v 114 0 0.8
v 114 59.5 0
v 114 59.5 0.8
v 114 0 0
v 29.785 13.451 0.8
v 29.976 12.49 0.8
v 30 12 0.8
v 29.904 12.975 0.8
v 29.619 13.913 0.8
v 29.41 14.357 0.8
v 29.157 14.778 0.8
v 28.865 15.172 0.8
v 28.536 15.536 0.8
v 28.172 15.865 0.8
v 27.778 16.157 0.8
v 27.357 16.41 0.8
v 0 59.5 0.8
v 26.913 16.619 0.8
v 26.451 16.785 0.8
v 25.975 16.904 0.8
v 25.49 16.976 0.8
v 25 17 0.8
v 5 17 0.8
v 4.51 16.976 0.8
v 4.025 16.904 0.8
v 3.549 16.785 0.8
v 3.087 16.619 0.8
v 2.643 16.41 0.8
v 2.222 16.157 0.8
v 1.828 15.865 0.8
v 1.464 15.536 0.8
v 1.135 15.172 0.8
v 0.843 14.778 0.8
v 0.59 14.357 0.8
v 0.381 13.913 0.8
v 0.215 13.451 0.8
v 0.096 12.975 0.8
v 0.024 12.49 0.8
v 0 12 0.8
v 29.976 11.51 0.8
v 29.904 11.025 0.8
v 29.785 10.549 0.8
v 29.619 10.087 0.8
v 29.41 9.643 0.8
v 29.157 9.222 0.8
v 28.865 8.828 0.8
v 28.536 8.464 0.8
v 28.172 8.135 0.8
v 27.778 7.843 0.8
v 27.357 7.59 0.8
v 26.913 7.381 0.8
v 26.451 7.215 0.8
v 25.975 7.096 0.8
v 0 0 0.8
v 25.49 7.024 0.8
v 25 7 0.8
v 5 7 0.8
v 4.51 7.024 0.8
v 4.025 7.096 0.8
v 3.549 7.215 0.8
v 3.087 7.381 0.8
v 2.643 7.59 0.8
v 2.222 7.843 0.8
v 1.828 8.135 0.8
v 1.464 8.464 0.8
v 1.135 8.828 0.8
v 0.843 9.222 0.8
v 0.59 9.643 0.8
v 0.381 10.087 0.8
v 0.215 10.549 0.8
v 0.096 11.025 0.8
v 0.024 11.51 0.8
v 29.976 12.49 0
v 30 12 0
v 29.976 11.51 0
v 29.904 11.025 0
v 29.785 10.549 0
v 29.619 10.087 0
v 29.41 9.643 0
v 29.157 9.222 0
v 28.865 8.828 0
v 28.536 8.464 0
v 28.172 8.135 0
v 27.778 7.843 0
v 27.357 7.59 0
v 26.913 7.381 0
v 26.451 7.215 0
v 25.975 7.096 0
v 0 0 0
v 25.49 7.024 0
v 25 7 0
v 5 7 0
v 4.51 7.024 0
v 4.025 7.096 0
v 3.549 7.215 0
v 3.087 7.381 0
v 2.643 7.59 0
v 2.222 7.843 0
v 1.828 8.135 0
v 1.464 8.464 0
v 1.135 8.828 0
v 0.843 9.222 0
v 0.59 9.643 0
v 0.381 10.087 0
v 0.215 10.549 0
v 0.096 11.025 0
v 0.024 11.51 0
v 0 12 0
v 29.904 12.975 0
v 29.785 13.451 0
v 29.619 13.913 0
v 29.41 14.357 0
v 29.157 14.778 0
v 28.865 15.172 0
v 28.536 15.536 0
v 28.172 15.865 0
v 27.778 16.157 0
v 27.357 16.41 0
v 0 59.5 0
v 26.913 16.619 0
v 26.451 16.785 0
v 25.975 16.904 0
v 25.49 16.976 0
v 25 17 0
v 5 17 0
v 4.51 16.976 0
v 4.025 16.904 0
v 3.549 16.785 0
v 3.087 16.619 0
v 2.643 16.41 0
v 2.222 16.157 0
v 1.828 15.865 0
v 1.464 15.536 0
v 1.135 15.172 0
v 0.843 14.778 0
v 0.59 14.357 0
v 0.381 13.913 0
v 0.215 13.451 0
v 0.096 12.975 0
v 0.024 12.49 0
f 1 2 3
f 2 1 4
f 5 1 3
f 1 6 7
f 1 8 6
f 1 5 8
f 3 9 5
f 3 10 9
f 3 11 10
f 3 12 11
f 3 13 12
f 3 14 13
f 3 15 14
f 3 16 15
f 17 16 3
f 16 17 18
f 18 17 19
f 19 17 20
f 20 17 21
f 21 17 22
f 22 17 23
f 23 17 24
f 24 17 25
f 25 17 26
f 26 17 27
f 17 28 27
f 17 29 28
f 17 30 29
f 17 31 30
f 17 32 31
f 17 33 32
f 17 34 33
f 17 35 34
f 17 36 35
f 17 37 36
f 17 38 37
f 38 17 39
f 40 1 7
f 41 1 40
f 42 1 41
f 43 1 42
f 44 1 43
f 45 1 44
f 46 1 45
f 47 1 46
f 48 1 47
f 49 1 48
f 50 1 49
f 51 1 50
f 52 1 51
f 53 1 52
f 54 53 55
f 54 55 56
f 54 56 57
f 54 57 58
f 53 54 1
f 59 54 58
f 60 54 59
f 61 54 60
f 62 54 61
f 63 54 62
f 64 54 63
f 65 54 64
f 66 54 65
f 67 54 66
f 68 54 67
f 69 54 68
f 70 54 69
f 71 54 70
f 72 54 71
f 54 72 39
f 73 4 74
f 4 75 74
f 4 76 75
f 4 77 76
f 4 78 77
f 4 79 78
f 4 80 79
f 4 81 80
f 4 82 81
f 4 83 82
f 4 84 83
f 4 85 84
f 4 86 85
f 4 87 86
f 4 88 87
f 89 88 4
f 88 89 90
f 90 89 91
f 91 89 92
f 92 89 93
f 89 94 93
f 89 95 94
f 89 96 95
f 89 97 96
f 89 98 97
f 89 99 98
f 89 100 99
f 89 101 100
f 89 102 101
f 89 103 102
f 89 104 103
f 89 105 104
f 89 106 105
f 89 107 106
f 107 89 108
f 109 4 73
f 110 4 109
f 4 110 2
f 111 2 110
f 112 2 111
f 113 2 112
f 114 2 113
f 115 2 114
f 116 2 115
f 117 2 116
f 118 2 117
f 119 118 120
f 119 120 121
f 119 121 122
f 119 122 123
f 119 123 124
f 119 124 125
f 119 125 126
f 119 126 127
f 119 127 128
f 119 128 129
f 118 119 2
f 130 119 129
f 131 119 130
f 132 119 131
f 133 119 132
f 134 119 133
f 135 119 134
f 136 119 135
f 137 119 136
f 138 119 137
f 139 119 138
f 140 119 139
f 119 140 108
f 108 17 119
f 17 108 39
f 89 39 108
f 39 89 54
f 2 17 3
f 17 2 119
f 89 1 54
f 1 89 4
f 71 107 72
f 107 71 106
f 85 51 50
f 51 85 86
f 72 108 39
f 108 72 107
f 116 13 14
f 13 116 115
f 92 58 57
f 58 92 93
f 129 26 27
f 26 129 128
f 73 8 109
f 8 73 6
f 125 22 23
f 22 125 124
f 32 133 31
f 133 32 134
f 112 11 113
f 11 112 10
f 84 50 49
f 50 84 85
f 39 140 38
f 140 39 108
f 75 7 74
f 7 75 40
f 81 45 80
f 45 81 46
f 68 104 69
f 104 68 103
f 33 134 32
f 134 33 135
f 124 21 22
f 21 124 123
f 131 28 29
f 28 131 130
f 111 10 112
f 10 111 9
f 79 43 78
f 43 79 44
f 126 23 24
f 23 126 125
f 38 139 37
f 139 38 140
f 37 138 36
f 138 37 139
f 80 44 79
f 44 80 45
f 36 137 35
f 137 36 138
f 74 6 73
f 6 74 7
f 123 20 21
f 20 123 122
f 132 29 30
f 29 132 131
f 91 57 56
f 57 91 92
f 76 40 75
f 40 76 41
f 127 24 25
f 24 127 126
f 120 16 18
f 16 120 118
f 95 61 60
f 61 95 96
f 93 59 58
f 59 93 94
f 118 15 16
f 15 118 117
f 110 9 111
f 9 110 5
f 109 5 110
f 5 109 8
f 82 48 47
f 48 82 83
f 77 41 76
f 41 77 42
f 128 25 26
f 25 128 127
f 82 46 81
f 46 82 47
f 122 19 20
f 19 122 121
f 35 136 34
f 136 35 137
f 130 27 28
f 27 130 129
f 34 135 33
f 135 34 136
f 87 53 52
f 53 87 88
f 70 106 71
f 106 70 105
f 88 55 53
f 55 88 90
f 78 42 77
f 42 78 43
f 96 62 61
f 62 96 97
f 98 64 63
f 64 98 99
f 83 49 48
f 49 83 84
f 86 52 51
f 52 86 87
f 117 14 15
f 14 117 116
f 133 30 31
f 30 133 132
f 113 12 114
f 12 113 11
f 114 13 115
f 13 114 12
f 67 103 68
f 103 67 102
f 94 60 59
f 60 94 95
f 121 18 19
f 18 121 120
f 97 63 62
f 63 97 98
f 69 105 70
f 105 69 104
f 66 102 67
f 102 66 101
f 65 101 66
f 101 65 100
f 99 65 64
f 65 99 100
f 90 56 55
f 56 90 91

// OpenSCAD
// Parameters (mm)
plate_L = 114.0;
plate_W = 59.5;
plate_T = 0.8;

slot_L = 30;
slot_W = 10;
slot_end_r = slot_W/2;          // ensure true obround ends
slot_center_x_from_left = 15;
slot_center_y_from_bottom = 12;

$fn = 64;

// Base plate (non-centered for unambiguous "from left/bottom" placement)
module plate_body() {
    cube([plate_L, plate_W, plate_T], center=false);
}

// Obround slot (through-cut along Z)
module obround_slot_3d() {
    // Build in XY, then extrude in Z
    linear_extrude(height = plate_T + 2, center = true)
        hull() {
            translate([-(slot_L/2 - slot_end_r), 0]) circle(r = slot_end_r);
            translate([ +(slot_L/2 - slot_end_r), 0]) circle(r = slot_end_r);
        }
}

module plate_with_slot() {
    difference() {
        plate_body();

        // Place slot by its center measured from left/bottom edges of the plate
        translate([slot_center_x_from_left, slot_center_y_from_bottom, plate_T/2])
            obround_slot_3d();
    }
}

// Final
plate_with_slot();
